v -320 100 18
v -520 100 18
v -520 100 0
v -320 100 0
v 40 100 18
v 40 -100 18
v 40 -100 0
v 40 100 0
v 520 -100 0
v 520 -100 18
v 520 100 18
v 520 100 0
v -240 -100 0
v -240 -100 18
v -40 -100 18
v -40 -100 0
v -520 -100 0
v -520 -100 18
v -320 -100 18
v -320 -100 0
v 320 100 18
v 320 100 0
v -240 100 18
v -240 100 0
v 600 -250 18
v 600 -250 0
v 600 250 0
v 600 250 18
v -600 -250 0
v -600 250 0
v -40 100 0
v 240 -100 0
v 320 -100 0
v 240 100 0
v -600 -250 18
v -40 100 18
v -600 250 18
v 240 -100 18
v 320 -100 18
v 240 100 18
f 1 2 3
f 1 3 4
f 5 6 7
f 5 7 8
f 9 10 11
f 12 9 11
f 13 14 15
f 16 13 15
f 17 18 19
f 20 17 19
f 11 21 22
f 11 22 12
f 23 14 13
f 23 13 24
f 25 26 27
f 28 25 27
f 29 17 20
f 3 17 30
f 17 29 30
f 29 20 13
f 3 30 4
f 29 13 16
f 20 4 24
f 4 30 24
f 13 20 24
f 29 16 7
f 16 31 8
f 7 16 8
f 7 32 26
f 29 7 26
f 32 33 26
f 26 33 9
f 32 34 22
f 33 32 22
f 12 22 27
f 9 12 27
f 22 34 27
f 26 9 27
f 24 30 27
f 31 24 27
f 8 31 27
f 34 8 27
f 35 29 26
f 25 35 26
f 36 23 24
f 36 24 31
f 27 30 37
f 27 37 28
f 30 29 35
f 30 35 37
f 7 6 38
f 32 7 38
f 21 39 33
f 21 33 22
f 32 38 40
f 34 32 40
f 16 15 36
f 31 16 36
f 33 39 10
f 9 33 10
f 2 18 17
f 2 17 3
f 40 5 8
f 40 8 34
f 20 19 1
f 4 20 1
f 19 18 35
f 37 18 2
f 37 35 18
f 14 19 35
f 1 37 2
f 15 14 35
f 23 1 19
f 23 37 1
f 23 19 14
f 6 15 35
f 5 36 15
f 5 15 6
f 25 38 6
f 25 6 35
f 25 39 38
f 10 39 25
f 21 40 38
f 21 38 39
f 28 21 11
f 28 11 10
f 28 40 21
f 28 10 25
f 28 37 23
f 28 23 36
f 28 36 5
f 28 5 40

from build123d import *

# Parameters (mm, degrees)
SKETCH_W            = 1200
SKETCH_H            = 500
PAD_DEPTH           = 18
SKETCH006_W         = 200
SKETCH006_H         = 200
POCKET_DEPTH        = 18
LINEARPATTERN_COUNT = 4
LINEARPATTERN_PITCH = 280


with BuildPart() as part:
    # Sketch → Pad (new body)
    with BuildSketch(Plane.XY):
        Rectangle(SKETCH_W, SKETCH_H)
    extrude(amount=PAD_DEPTH)

    # Sketch006 (on Face6 of Pad) → Pocket (cut)
    with BuildSketch(Plane.XY.offset(18)):
        with Locations((-420, 0)):
            Rectangle(SKETCH006_W, SKETCH006_H)
    pocket = extrude(amount=-POCKET_DEPTH, mode=Mode.SUBTRACT)

    # LinearPattern: Pocket ×4
    with Locations(*[(i * LINEARPATTERN_PITCH, 0, 0) for i in range(1, LINEARPATTERN_COUNT)]):
        add(pocket, mode=Mode.SUBTRACT)


solid = part.part
